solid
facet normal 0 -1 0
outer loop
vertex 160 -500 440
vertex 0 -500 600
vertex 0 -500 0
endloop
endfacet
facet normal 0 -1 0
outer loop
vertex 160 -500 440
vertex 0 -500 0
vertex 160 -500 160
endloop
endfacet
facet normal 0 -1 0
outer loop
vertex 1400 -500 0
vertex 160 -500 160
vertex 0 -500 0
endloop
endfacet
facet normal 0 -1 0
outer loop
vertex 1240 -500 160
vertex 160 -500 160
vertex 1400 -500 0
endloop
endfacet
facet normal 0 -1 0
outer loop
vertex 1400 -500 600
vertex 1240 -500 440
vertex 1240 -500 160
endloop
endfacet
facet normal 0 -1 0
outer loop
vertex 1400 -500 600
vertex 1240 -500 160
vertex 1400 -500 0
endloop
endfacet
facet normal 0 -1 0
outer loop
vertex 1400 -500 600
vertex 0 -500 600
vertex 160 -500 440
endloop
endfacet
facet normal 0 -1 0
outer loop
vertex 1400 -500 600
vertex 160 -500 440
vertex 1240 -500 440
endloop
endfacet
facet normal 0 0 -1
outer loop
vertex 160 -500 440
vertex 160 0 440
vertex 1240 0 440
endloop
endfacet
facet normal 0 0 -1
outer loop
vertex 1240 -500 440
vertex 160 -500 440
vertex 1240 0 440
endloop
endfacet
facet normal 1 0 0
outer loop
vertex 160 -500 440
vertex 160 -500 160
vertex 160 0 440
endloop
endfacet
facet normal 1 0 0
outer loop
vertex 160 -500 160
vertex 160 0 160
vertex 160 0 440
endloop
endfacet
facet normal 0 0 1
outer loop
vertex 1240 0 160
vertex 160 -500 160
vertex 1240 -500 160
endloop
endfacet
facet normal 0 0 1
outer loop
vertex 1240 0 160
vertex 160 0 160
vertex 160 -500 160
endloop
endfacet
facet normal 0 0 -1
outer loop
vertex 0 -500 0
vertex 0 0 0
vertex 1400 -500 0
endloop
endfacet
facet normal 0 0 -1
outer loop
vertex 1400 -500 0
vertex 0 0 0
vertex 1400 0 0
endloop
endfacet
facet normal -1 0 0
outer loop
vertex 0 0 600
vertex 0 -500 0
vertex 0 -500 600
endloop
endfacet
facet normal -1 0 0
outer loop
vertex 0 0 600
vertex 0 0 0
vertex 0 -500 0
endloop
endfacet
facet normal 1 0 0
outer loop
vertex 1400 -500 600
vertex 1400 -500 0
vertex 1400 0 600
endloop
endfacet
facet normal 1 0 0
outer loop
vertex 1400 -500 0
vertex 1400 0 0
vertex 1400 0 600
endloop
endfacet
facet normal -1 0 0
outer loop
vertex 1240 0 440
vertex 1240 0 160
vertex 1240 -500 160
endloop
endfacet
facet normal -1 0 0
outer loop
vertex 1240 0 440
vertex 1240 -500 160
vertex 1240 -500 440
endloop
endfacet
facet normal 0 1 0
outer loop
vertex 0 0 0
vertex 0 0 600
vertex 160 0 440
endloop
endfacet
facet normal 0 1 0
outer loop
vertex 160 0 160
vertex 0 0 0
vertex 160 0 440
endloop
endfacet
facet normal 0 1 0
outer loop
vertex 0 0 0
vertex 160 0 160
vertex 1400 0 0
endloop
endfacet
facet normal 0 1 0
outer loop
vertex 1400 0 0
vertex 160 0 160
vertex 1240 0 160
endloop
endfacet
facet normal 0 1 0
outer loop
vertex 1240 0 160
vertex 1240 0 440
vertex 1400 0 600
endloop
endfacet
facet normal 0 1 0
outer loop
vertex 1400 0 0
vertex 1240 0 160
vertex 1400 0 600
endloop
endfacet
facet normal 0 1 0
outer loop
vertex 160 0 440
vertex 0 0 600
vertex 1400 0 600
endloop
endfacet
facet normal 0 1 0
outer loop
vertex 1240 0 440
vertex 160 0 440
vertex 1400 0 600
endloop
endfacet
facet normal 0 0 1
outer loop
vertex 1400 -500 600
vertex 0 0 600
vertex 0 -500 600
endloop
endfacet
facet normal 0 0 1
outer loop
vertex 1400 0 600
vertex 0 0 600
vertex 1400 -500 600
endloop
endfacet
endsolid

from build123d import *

# Parameters (mm, degrees)
F0_W        = 1400
F0_H        = 600
F0_W_2      = 1080
F0_H_2      = 280
F1_DEPTH    = 420
F1_FACE_W   = 1400
F1_FACE_H   = 600
F1_FACE_W_2 = 1080
F1_FACE_H_2 = 280
F2_DEPTH    = 80


with BuildPart() as f1:
    # F0 (on Front) → F1 (new body)
    with BuildSketch(Plane.XZ):
        with Locations((700, 300)):
            Rectangle(F0_W, F0_H)
        with Locations((700, 300)):
            Rectangle(F0_W_2, F0_H_2, mode=Mode.SUBTRACT)
    extrude(amount=F1_DEPTH)

    # F1_face (on face) → F2 (join)
    with BuildSketch(Plane(origin=(700, -420, 300), x_dir=(1, 0, 0), z_dir=(0, -1, 0))):
        Rectangle(F1_FACE_W, F1_FACE_H)
        Rectangle(F1_FACE_W_2, F1_FACE_H_2, mode=Mode.SUBTRACT)
    extrude(amount=F2_DEPTH)


solid = f1.part
